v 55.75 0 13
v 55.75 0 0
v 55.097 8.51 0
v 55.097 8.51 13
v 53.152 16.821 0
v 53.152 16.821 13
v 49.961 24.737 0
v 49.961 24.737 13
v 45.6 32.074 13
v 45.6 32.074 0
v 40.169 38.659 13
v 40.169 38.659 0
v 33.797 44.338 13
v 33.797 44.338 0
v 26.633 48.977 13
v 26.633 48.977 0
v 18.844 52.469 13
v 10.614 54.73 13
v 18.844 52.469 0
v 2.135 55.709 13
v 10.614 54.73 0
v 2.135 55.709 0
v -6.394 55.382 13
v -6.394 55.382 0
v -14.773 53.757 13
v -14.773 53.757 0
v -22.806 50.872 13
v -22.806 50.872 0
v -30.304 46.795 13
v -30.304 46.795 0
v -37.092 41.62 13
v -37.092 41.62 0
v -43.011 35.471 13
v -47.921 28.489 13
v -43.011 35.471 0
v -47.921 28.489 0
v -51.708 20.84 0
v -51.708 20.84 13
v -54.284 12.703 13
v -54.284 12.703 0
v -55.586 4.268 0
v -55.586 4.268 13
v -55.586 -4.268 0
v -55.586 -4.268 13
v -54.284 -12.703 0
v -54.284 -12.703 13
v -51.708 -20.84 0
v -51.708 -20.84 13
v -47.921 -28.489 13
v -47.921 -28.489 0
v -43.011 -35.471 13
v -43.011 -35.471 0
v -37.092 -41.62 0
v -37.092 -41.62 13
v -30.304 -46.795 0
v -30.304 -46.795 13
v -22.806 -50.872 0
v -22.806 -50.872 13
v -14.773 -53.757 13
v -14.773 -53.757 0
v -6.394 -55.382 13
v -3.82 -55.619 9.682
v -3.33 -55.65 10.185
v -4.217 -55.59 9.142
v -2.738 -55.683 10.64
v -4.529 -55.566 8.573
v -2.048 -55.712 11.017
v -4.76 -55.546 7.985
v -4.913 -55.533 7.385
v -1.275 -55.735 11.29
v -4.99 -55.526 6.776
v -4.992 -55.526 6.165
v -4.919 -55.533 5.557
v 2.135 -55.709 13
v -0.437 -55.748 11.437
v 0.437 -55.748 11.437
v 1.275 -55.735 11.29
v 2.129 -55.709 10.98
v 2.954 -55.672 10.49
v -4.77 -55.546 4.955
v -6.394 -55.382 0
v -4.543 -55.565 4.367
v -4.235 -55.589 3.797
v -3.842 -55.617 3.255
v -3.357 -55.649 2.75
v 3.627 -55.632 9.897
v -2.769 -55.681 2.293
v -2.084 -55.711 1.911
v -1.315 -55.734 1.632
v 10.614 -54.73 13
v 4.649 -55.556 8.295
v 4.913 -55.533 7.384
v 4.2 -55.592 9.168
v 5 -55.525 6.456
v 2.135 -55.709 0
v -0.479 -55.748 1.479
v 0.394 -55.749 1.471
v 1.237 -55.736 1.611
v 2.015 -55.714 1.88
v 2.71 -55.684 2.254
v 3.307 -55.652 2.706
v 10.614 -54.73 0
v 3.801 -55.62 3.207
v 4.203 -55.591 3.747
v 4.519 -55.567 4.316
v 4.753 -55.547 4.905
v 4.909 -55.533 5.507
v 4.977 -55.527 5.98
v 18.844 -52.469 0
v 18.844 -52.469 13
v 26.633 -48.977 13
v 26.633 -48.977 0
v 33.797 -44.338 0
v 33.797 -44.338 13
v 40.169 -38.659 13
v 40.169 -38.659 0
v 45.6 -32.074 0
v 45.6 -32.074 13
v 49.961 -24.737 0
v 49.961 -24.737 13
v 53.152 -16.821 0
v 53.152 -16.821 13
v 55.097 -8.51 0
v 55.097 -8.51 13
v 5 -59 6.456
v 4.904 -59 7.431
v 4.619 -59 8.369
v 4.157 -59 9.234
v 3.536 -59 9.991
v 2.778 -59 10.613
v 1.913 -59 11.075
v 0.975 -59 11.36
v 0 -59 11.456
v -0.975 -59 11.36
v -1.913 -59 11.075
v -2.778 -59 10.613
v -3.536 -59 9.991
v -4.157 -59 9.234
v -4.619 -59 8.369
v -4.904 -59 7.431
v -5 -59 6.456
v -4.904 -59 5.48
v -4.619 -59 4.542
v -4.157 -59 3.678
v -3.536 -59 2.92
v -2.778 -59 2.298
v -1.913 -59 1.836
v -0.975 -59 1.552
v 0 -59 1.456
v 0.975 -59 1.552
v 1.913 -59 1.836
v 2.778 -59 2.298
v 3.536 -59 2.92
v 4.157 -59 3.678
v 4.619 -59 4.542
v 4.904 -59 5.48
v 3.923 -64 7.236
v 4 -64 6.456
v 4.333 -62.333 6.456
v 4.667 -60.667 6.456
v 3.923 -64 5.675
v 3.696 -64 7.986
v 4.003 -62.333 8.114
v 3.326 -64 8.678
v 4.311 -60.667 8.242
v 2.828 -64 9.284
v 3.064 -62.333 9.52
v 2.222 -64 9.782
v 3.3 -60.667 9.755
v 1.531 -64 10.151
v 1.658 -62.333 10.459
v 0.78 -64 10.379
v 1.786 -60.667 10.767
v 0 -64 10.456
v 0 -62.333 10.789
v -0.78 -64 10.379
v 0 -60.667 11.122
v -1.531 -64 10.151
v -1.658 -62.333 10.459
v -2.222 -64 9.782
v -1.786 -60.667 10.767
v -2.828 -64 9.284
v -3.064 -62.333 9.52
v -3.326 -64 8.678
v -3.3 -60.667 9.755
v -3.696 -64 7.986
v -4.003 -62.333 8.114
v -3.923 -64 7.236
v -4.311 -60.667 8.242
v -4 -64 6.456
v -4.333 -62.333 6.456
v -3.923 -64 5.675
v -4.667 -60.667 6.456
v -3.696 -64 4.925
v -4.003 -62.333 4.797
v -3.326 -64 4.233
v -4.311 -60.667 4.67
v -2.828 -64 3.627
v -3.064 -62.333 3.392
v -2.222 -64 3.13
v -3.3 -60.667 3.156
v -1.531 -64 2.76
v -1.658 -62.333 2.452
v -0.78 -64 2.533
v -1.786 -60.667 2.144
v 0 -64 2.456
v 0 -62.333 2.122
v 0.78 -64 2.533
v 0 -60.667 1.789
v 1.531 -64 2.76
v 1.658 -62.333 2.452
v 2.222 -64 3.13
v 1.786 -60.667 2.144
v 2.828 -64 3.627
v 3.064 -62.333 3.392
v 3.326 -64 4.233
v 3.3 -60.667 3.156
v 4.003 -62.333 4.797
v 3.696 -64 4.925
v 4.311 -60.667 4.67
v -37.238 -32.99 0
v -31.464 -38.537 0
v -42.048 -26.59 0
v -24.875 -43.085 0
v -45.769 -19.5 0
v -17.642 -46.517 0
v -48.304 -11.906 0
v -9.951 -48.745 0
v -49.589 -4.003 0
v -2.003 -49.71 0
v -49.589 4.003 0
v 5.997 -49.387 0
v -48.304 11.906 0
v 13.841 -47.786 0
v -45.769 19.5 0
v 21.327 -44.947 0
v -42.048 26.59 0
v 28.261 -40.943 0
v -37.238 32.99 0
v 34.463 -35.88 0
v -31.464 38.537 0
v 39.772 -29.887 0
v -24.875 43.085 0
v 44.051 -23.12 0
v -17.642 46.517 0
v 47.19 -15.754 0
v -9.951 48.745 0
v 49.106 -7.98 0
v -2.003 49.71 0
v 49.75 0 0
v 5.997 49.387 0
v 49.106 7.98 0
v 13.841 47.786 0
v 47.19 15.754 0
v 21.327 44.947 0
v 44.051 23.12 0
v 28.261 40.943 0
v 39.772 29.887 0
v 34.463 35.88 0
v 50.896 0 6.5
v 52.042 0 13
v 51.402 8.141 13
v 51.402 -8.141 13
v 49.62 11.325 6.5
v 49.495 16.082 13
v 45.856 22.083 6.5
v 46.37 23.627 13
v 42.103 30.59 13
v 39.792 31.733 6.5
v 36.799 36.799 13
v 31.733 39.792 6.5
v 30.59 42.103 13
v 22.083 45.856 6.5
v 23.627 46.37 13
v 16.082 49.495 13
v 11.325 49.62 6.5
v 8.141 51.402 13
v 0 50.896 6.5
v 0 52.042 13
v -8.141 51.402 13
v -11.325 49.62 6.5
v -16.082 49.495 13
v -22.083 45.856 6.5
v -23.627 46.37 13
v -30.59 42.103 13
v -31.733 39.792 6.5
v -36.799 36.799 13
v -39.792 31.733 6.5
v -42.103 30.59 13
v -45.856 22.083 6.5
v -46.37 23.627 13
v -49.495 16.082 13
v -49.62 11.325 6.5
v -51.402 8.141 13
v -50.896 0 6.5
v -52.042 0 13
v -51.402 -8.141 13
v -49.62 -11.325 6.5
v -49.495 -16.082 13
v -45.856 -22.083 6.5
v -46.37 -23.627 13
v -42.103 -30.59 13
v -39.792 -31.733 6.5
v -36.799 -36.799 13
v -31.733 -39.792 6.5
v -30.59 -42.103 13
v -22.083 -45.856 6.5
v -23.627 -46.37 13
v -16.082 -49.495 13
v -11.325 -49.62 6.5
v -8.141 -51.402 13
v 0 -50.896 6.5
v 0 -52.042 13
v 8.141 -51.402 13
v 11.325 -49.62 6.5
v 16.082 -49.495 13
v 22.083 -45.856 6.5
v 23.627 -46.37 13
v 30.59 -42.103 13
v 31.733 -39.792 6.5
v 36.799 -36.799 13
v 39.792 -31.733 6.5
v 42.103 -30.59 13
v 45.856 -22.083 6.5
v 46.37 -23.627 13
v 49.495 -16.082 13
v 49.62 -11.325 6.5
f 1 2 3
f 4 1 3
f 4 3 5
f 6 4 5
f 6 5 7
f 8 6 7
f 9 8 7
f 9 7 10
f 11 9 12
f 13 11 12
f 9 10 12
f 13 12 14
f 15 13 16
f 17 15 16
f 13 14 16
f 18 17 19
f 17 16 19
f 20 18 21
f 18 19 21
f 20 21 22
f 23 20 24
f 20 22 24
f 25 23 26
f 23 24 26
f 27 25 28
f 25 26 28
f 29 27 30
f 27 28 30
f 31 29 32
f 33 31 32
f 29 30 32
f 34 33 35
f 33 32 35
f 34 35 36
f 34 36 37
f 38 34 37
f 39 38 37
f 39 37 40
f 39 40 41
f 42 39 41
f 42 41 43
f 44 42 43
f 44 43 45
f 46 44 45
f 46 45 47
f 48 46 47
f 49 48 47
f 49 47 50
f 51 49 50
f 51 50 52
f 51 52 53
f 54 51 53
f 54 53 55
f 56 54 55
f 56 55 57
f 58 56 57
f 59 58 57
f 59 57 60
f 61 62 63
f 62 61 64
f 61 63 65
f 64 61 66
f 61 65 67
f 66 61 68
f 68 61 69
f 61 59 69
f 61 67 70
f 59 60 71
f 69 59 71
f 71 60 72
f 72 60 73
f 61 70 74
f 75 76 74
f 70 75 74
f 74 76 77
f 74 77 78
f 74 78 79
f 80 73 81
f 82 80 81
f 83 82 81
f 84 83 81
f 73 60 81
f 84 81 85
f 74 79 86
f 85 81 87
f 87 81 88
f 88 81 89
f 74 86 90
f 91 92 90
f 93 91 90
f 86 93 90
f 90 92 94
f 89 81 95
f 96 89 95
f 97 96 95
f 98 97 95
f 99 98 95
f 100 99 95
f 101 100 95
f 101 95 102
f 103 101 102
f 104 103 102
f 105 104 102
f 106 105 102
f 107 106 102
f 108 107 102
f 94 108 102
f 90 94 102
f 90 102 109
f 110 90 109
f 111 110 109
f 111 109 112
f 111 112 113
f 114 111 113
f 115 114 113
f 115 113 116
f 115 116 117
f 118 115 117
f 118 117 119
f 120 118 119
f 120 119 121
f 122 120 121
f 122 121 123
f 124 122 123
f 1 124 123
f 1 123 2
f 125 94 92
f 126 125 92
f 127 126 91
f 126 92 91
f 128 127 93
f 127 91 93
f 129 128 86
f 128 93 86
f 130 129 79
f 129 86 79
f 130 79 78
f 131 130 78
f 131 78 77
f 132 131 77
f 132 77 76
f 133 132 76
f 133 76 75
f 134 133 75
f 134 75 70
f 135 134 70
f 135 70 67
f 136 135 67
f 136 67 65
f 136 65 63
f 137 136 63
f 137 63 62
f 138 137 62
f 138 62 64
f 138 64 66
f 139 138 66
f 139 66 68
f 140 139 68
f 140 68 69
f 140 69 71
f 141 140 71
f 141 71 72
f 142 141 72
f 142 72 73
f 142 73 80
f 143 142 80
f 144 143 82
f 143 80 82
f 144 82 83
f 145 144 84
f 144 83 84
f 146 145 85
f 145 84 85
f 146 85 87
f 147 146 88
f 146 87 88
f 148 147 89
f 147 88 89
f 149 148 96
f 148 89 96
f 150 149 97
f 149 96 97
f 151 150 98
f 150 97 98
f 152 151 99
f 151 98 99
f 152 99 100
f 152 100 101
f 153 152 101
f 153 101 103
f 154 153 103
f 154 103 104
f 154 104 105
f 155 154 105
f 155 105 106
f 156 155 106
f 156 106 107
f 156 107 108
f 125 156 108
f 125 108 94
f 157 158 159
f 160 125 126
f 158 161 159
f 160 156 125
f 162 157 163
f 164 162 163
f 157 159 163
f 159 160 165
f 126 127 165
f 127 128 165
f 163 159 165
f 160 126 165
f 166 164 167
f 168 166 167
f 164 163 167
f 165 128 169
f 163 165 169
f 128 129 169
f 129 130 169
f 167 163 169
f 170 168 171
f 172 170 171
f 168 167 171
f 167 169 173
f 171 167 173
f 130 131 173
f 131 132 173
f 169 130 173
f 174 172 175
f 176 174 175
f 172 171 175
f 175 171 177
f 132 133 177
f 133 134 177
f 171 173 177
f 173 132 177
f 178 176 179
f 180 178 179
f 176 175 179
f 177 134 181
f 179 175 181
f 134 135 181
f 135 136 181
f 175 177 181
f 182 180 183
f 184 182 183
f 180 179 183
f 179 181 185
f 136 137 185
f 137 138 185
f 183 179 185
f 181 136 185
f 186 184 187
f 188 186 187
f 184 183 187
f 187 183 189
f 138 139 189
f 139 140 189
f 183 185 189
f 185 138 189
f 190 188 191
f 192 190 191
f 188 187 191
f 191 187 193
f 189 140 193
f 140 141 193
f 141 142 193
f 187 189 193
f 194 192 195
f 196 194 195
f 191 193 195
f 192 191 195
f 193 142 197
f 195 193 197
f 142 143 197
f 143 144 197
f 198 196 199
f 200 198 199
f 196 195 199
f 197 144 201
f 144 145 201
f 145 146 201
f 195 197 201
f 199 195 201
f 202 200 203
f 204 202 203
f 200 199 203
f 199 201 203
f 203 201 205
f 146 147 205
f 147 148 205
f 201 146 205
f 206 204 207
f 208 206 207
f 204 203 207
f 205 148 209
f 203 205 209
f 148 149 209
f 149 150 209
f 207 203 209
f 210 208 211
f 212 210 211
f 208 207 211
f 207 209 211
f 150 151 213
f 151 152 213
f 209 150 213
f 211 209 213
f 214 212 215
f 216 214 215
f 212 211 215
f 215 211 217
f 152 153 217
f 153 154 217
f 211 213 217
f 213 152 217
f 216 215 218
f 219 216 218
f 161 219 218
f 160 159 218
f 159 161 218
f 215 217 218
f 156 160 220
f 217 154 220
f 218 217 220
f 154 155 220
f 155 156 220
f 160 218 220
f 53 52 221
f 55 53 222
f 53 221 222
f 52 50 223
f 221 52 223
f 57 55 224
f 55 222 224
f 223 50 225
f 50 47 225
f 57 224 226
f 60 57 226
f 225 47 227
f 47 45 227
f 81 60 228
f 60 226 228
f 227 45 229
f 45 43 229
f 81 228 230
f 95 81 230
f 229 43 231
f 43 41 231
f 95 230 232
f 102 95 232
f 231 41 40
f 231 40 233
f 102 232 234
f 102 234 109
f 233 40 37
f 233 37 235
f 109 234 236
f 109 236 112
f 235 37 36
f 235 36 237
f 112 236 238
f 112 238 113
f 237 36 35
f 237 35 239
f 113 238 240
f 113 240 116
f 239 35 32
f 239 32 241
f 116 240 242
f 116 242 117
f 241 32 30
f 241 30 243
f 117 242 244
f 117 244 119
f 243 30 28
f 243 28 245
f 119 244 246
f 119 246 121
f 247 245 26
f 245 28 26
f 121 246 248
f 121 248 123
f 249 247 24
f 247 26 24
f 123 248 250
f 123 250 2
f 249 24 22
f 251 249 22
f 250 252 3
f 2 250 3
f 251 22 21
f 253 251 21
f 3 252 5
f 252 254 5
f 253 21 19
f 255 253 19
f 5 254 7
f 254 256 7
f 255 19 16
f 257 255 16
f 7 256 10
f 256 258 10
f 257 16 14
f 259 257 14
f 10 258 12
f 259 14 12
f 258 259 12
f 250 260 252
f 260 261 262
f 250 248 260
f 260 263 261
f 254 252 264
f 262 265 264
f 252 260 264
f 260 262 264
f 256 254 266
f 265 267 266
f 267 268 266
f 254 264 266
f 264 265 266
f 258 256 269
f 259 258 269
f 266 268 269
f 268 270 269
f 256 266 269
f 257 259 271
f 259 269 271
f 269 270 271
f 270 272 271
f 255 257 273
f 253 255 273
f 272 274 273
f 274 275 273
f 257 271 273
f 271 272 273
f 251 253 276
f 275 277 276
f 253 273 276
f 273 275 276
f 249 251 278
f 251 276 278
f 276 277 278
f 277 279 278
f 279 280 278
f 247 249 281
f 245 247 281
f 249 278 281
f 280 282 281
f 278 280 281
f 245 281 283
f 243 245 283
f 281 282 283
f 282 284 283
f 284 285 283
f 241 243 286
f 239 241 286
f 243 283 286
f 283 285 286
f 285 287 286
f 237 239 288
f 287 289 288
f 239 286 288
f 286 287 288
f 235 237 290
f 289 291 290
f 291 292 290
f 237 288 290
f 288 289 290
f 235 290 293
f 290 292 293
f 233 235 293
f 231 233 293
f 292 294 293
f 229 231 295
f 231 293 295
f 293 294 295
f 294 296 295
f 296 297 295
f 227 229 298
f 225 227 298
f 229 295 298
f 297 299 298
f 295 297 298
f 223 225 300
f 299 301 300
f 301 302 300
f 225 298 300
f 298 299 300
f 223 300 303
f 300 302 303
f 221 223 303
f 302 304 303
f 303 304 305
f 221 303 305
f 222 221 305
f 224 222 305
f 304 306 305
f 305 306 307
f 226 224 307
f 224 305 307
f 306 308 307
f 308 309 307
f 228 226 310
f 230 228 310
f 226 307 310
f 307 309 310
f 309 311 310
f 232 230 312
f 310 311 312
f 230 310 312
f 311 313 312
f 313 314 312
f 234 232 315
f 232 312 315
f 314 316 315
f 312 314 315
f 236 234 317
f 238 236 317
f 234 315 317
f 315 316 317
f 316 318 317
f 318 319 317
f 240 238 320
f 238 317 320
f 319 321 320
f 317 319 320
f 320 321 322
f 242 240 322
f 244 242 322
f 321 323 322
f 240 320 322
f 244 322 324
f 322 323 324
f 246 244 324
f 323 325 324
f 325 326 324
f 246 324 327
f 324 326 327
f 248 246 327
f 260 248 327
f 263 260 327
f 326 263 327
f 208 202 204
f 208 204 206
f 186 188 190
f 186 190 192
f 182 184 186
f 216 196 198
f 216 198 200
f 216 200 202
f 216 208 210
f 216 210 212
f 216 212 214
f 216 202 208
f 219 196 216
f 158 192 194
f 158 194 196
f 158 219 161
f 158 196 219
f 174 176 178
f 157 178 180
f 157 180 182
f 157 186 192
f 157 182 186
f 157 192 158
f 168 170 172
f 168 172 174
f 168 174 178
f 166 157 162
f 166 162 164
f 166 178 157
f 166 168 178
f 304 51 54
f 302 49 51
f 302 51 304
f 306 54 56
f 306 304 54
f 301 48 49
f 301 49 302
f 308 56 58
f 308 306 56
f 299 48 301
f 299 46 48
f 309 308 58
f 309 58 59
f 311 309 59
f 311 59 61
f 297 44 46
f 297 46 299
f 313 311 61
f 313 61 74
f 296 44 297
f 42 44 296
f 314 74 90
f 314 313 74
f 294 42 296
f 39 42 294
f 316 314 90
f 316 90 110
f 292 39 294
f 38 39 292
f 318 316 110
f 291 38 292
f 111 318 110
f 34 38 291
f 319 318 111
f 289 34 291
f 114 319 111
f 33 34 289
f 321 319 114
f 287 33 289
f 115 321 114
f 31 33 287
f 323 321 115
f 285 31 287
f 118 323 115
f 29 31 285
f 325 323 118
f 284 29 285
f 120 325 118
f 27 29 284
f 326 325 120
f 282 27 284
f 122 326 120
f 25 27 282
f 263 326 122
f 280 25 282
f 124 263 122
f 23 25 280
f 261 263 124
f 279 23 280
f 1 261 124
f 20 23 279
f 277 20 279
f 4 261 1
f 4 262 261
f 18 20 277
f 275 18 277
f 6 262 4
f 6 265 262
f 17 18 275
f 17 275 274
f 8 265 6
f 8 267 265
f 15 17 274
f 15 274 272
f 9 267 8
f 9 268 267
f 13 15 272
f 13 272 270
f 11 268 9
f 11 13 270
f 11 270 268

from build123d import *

# Parameters (mm, degrees)
F0_R     = 55.750000441
F0_R_2   = 49.75
F1_DEPTH = 13
F3_R     = 5
F4_DEPTH = 10
F5_SIZE2 = 2.292241
F5_SIZE  = 12.99999
F6_SIZE2 = 5
F6_SIZE  = 1


# Not quite as in the source:
# - a fillet or chamfer is up to 0.001 mm smaller than in the source, because OpenCascade refuses the exact size


with BuildPart() as f1:
    # F0 (on Top) → F1 (new body)
    with BuildSketch(Plane.XY):
        Circle(F0_R)
        Circle(F0_R_2, mode=Mode.SUBTRACT)
    extrude(amount=F1_DEPTH)

    # F3 (on offset) → F4 (join)
    with BuildSketch(Plane.XZ.offset(54)):
        with Locations((0, 6.4556576599)):
            Circle(F3_R)
    extrude(amount=F4_DEPTH)

    # F5 (size 13 and 2.2922507492 in the source; OpenCascade refuses exactly that, so slightly less here)
    f5_edges = [f1.edges().sort_by_distance(p)[0] for p in [
        (-49.75, 0, 13),
    ]]
    f5_side = f1.faces().sort_by_distance((-49.75, 0, 6.5))[0]
    chamfer(f5_edges, length=F5_SIZE, length2=F5_SIZE2, reference=f5_side)

    # F6
    f6_edges = [f1.edges().sort_by_distance(p)[0] for p in [
        (-5, -64, 6.455658),
    ]]
    f6_side = f1.faces().sort_by_distance((0, -64, 6.455658))[0]
    chamfer(f6_edges, length=F6_SIZE, length2=F6_SIZE2, reference=f6_side)


solid = f1.part
